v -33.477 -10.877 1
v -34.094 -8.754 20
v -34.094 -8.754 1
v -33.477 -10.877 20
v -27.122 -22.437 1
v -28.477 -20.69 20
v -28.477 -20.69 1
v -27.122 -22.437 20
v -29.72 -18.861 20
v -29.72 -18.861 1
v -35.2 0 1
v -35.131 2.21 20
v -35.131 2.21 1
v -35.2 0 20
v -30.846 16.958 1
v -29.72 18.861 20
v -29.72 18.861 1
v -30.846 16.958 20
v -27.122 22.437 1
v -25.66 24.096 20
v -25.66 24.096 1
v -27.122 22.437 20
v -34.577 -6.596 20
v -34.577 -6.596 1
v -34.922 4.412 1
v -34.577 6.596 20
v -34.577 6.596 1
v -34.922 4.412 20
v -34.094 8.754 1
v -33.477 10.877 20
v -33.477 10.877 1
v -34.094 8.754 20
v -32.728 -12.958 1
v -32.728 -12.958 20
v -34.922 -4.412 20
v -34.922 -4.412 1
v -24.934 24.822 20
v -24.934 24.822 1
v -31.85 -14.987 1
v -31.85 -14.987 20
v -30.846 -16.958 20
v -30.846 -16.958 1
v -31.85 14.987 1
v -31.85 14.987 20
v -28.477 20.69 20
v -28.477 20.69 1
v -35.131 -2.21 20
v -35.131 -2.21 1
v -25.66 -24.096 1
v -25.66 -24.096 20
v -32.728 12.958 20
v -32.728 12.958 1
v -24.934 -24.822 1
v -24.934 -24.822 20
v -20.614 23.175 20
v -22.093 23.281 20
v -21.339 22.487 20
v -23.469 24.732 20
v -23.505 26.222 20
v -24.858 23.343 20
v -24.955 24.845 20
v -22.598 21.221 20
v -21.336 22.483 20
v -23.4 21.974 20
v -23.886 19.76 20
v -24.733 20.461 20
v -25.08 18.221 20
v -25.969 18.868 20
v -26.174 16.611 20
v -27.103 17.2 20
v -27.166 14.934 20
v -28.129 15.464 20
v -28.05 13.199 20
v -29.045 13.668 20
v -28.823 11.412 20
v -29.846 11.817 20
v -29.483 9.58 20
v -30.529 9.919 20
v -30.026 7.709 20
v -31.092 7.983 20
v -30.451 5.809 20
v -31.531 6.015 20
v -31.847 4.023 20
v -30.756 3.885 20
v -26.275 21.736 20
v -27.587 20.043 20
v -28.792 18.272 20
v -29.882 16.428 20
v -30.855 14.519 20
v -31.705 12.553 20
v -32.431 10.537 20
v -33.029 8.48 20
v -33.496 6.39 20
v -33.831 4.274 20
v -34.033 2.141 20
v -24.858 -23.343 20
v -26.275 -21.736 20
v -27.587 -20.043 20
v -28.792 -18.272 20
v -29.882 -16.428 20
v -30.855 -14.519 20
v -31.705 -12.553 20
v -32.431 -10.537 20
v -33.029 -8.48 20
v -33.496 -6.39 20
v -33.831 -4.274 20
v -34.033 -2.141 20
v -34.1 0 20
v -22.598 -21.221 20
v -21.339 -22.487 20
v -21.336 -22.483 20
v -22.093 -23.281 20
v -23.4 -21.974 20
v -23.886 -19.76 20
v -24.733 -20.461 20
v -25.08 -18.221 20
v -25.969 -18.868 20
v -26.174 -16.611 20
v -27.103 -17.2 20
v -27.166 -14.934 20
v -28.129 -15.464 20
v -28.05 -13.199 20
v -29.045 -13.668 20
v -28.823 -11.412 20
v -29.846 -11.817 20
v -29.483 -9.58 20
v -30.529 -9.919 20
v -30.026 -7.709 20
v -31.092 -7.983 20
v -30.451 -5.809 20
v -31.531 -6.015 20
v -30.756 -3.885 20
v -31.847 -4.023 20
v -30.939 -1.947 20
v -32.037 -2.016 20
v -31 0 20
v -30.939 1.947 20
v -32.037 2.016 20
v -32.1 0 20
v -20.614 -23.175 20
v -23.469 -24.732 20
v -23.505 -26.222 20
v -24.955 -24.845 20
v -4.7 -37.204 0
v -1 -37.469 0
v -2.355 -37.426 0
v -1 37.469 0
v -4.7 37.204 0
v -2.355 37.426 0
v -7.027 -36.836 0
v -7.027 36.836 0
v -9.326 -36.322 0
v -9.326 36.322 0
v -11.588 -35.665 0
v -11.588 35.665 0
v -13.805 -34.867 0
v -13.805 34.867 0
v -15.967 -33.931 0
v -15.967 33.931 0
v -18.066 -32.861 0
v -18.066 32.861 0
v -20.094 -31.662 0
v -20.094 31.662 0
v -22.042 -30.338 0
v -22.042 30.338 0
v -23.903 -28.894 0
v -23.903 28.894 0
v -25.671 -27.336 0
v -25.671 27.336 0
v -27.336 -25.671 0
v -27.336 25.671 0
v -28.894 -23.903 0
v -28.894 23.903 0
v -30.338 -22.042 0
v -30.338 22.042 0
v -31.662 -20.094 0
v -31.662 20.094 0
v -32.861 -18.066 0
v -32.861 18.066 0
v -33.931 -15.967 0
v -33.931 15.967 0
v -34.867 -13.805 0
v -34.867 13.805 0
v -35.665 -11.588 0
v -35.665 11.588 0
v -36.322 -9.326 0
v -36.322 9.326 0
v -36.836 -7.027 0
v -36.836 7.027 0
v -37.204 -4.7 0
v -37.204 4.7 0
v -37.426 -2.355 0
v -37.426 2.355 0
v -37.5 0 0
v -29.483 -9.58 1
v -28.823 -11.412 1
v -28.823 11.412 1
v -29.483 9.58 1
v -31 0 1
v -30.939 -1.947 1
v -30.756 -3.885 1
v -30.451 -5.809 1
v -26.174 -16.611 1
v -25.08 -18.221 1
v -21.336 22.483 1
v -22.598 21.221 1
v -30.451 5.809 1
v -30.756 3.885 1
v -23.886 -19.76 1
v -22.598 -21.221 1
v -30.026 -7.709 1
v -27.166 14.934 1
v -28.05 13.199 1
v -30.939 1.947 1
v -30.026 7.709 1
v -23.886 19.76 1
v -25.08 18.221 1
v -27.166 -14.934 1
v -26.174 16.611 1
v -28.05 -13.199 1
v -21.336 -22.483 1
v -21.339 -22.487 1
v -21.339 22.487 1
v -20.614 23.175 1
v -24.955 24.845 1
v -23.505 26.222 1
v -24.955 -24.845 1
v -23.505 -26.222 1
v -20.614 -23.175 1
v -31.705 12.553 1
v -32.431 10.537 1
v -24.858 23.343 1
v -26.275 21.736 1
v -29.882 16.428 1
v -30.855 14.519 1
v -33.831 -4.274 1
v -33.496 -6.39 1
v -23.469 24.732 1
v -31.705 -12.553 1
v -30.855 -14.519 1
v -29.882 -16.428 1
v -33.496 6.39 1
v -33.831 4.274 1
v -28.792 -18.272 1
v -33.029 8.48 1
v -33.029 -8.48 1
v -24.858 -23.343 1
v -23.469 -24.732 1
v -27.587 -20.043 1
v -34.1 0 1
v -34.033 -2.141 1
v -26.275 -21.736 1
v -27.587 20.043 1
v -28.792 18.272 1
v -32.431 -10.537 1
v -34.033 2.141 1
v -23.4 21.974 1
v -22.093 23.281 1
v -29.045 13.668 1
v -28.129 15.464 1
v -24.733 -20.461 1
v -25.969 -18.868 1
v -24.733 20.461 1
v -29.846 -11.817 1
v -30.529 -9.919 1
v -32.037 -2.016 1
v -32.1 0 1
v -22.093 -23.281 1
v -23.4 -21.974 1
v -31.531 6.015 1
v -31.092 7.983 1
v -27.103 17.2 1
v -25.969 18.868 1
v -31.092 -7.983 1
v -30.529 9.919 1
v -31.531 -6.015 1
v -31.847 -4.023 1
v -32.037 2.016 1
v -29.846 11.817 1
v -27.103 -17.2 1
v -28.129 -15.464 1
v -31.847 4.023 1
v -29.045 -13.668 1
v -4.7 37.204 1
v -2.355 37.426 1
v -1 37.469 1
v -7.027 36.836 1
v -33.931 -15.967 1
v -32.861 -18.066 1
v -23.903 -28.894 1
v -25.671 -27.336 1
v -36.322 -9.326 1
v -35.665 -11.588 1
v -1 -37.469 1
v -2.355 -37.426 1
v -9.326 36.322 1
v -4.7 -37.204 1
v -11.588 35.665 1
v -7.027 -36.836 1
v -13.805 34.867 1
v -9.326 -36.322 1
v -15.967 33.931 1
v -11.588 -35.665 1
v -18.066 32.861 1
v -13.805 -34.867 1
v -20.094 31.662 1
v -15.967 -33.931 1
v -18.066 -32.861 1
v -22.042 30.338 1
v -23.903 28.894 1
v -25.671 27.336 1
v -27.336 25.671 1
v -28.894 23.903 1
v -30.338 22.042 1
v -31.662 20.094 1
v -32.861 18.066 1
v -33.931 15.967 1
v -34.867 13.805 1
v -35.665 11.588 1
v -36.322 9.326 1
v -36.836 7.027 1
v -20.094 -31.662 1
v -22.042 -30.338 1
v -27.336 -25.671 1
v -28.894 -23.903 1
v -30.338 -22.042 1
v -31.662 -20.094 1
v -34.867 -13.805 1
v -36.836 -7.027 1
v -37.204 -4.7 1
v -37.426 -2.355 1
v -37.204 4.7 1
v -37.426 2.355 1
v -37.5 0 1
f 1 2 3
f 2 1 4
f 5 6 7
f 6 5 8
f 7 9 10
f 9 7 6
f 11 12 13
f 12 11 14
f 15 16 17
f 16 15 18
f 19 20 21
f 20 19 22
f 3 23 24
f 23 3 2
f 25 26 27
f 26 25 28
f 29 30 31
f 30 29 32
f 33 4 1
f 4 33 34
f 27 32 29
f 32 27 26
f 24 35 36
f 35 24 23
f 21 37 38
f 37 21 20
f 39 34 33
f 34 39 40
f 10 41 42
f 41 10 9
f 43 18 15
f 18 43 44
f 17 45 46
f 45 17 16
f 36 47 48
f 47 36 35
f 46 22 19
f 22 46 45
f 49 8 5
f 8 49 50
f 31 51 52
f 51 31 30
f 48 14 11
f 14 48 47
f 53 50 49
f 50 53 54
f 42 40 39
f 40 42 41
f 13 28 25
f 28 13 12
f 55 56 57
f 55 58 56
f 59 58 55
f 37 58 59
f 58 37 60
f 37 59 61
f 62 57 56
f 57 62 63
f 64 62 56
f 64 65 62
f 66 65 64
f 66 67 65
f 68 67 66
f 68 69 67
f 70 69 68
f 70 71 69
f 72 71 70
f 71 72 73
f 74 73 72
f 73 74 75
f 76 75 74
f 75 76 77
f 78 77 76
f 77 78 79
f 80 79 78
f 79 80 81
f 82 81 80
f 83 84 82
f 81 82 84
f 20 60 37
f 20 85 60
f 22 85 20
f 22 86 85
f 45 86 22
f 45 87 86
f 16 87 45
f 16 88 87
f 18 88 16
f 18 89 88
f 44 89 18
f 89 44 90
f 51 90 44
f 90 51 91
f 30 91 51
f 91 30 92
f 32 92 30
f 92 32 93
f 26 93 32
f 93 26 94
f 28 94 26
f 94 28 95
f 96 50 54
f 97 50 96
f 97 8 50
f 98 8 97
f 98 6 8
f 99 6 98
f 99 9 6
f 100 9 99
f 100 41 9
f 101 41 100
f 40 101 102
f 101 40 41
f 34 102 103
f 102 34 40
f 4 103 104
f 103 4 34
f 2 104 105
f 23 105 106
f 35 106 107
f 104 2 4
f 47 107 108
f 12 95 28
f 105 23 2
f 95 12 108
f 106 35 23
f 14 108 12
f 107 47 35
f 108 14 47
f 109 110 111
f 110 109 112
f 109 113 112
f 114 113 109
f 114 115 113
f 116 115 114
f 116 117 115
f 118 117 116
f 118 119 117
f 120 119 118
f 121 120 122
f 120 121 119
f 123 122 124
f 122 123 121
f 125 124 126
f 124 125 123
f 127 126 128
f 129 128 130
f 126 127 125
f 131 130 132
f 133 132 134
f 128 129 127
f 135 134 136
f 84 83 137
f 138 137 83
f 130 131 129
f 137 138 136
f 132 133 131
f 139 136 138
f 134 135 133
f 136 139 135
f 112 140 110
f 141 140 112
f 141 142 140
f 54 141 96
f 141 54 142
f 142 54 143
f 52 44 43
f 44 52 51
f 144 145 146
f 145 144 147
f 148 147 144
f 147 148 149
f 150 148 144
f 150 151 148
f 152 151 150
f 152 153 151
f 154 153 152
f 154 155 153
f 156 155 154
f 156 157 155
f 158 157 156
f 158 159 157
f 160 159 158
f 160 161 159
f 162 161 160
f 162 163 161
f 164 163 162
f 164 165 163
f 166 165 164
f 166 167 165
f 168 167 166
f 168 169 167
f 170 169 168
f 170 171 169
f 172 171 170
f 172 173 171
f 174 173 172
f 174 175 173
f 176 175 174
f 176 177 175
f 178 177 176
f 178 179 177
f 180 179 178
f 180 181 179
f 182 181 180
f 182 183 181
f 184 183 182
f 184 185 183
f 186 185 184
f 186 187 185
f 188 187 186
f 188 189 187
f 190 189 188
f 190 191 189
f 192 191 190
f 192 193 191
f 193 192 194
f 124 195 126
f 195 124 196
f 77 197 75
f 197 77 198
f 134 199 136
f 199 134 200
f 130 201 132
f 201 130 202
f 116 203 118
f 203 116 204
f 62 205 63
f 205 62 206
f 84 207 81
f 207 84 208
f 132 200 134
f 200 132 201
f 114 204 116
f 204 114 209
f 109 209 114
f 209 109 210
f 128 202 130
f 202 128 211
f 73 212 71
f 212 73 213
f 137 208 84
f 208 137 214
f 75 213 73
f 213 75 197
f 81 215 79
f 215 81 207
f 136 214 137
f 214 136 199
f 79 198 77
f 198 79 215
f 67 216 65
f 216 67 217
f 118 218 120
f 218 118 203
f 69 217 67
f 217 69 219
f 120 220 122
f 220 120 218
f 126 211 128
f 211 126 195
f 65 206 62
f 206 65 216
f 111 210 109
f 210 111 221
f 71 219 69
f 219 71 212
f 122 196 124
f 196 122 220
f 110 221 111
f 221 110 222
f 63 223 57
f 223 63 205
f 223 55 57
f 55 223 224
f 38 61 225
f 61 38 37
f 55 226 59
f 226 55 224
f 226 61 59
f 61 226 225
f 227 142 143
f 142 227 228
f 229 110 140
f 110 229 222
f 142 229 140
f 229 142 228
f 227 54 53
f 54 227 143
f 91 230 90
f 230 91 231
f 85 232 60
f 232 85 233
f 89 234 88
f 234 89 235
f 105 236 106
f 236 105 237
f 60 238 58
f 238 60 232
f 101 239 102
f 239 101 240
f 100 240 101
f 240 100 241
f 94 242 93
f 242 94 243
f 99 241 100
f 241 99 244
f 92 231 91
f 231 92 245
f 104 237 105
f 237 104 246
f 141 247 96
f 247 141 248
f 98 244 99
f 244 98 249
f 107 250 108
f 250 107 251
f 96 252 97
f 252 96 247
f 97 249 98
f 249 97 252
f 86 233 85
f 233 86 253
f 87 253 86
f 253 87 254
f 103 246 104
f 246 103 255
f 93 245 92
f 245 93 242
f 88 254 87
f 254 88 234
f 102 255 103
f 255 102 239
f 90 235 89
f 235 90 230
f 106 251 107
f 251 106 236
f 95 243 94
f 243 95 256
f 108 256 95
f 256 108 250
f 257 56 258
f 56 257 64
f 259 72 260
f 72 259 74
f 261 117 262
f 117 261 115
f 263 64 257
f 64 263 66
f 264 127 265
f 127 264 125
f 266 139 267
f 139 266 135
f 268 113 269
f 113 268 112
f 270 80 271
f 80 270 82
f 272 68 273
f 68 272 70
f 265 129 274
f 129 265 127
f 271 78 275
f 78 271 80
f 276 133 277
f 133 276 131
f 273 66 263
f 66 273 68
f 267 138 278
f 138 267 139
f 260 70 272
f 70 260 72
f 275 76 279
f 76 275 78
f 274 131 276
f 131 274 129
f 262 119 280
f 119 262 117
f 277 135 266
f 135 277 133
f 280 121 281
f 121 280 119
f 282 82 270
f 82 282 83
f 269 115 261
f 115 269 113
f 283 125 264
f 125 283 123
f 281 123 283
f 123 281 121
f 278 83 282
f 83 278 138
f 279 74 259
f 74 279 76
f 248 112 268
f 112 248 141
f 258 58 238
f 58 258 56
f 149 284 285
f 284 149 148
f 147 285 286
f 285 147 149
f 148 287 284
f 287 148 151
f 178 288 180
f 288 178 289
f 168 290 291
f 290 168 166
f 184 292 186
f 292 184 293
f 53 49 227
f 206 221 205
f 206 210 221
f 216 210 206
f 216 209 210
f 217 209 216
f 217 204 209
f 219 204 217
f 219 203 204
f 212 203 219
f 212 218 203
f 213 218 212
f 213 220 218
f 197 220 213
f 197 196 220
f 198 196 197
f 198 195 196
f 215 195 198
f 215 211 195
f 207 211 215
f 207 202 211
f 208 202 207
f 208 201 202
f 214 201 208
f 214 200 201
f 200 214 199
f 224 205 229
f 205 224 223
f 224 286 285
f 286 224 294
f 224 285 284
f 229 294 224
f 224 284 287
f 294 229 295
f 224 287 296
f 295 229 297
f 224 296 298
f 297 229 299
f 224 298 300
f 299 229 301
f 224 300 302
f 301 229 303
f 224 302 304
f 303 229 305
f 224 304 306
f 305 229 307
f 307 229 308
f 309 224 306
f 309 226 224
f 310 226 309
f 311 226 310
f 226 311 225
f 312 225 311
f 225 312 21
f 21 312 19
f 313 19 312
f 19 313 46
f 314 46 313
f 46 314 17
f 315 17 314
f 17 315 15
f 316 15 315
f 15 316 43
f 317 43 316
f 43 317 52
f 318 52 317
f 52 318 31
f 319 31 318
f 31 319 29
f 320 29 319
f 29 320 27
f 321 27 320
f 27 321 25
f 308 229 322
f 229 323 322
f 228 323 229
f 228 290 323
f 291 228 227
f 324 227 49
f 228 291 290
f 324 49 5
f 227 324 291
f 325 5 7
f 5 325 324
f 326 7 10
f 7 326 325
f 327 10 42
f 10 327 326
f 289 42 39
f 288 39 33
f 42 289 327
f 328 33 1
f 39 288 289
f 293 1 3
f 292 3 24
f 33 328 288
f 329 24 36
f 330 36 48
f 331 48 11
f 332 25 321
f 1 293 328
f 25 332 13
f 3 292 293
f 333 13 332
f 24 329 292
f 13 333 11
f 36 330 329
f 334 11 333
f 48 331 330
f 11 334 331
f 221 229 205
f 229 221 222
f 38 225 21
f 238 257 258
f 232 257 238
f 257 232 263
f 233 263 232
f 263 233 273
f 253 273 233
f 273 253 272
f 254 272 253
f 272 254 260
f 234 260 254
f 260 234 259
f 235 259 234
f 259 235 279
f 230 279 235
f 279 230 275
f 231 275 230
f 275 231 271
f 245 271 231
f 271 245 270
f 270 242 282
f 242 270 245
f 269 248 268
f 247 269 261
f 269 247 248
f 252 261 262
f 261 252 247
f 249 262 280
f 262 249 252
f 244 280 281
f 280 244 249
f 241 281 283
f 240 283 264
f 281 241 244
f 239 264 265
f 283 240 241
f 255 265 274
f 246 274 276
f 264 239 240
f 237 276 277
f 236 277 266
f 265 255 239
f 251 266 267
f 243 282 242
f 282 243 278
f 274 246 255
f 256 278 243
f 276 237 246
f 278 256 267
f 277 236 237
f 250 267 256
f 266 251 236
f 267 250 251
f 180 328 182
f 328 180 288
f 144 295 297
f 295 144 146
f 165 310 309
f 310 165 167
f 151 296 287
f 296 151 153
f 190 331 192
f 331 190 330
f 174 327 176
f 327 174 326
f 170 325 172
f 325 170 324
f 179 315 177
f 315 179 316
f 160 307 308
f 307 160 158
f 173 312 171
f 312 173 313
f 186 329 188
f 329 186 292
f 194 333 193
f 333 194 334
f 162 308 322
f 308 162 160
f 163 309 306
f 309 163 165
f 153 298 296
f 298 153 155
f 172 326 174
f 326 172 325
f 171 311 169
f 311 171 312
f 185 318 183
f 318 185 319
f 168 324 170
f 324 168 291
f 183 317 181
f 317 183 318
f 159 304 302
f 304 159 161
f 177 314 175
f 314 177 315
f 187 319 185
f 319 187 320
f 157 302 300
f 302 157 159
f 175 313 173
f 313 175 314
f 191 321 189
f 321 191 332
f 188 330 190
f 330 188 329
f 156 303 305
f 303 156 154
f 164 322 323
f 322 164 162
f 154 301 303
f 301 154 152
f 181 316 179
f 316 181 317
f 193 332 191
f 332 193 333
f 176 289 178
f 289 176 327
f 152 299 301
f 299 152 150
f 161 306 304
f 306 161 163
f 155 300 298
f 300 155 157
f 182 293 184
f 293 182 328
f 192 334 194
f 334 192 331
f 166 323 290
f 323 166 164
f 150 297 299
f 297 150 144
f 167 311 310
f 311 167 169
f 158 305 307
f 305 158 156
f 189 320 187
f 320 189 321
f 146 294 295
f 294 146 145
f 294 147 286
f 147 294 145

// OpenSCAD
// Rinne mit Hohlraum und automatisch angepassten Rechtecken
// Maße in mm
// Angepasst für einen variablen Öffnungswinkel
// Korrigierte Version für höhere Öffnungswinkel

// Steuerungsparameter - mit diesen Variablen können Teile ein-/ausgeblendet werden
show_steckplatz = true;  // Auf true setzen, um den Steckplatz anzuzeigen
show_kreis = true;       // Auf true setzen, um den Kreis anzuzeigen
show_halbkreis = true;   // Auf true gesetzt, um einen Halbkreis statt eines vollen Kreises anzuzeigen
schnitt_hoehe = 0;       // Höhe des Schnitts vom Mittelpunkt aus (0 = genau Halbkreis, positiver Wert = mehr abschneiden)

// Parameter
hoehe = 20;                 
innendurchmesser = 62; 
wandstaerke_aussen = 4.2;       // Gesamtwandstärke
abstand_zwischen_schalen = 2; // Abstand zwischen den beiden Halbschalen
rechteck_dicke = 2;           // Dicke der Verschlussrechtecke
gesamtoeffnungswinkel = 93;   // Gesamtöffnungswinkel

// Berechnung abgeleiteter Werte
innenradius = innendurchmesser / 2;
aussenradius = innenradius + wandstaerke_aussen;
mittelpunkt_radius = (innenradius + aussenradius) / 2;

// Dicke der einzelnen Halbschalen berechnen
schale_dicke = (wandstaerke_aussen - abstand_zwischen_schalen) / 2;

// Berechnung der Positionen für die Rechtecke
// Position der inneren Kante des Hohlraums
hohlraum_innen_y = innenradius + schale_dicke;
// Position der äußeren Kante des Hohlraums
hohlraum_aussen_y = aussenradius - schale_dicke;

// Berechnungen für die Rinne
start_winkel = 180 - gesamtoeffnungswinkel/2;  // Startwinkel für den Schnitt
end_winkel = 180 + gesamtoeffnungswinkel/2;    // Endwinkel für den Schnitt (KORRIGIERT)

// Modul für Rinnensegment mit angepasstem Öffnungswinkel
module rinnen_segment(radius, hoehe) {
    rotate([0, 0, start_winkel]) {
        rotate_extrude(angle = gesamtoeffnungswinkel, $fn = 100)
            translate([radius, 0, 0])
                square([0.001, hoehe]); // Sehr dünne Linie zur Erzeugung des Segments
    }
}

// Modul für den Steckplatz
module steckplatz(
    hoehe = 20,
    innendurchmesser = 62,
    wandstaerke_aussen = 4,
    abstand_zwischen_schalen = 1.9,
    rechteck_dicke = 2,
    gesamtoeffnungswinkel = 90
) {
    // Berechnung abgeleiteter Werte
    innenradius = innendurchmesser / 2;
    aussenradius = innenradius + wandstaerke_aussen;
    
    // Dicke der einzelnen Halbschalen berechnen
    schale_dicke = (wandstaerke_aussen - abstand_zwischen_schalen) / 2;
    
    // Berechnungen für die Rinne
    start_winkel = 180 - gesamtoeffnungswinkel/2;  // Startwinkel für den Schnitt
    end_winkel = 180 + gesamtoeffnungswinkel/2;    // Endwinkel für den Schnitt (KORRIGIERT)
    
    // Winkel für die Rechtecke an den Enden der Rinne
    rechteck_winkel_rechts = start_winkel;     // Rechter Endpunkt der Rinne
    rechteck_winkel_links = end_winkel;        // Linker Endpunkt der Rinne (KORRIGIERT)
    
    // Gesamtes Modell
    difference() {
        union() {
            // Äußere Schale
            difference() {
                // Äußerer Zylinder
                cylinder(h = hoehe, r = aussenradius, center = false, $fn = 100);
                
                // Innerer Hohlraum
                cylinder(h = hoehe + 1, r = innenradius, center = false, $fn = 100);
                
                // Segment herausschneiden für den Öffnungswinkel
                rotate([0, 0, end_winkel])
                    rotate_extrude(angle = 360 - gesamtoeffnungswinkel, $fn = 100)
                        translate([0, 0, 0])
                            square([aussenradius + 1, hoehe + 2]);
            }
            
            // Erstes Rechteck (rechte Seite)
            rotate([0, 0, rechteck_winkel_rechts]) 
                translate([innenradius, -rechteck_dicke/2, 0])
                    cube([wandstaerke_aussen, rechteck_dicke, hoehe]);
            
            // Zweites Rechteck (linke Seite)
            rotate([0, 0, rechteck_winkel_links]) 
                translate([innenradius, -rechteck_dicke/2, 0])
                    cube([wandstaerke_aussen, rechteck_dicke, hoehe]);
        }
        
        // Hohlraum in der Mitte der Wandstärke
        difference() {
            cylinder(h = hoehe + 1, r = aussenradius - schale_dicke, center = false, $fn = 100);
            cylinder(h = hoehe + 2, r = innenradius + schale_dicke, center = false, $fn = 100);
            
            // Segment herausschneiden für den Öffnungswinkel (für den Hohlraum)
            rotate([0, 0, end_winkel])
                rotate_extrude(angle = 360 - gesamtoeffnungswinkel, $fn = 100)
                    translate([0, 0, 0])
                        square([aussenradius + 1, hoehe + 3]);
        }
    }
}

// Modul für einen Kreis mit bestimmtem Durchmesser und Stärke
module kreis(durchmesser = 75, staerke = 1, hoehe = 1, gefuellt = true) {
    if (gefuellt) {
        // Gefüllter Kreis
        cylinder(h = hoehe, d = durchmesser, center = false, $fn = 100);
    } else {
        // Ringförmiger Kreis
        difference() {
            cylinder(h = hoehe, d = durchmesser, center = false, $fn = 100);
            cylinder(h = hoehe + 1, d = durchmesser - 2 * staerke, center = false, $fn = 100);
        }
    }
}

// Modul für einen Halbkreis mit einstellbarer Schnitthöhe und Rotation um 90 Grad
module halbkreis(durchmesser = 75, staerke = 1, hoehe = 1, gefuellt = true, schnitt_position = 0) {
    rotate([0, 0, 90]) { // Um 90 Grad rotieren, damit der Einschub richtig sitzt
        difference() {
            // Basis-Kreis
            kreis(durchmesser, staerke, hoehe, gefuellt);
            
            // Schnittblock - schneidet den Kreis von unten
            // Die Schnitthöhe kann angepasst werden:
            // - schnitt_position = 0: genau in der Mitte (Halbkreis)
            // - schnitt_position > 0: mehr vom Kreis abschneiden (weniger als Halbkreis)
            // - schnitt_position < 0: weniger vom Kreis abschneiden (mehr als Halbkreis)
            
            // Größerer Schnittblock, der garantiert, dass wir nie von der anderen Seite schneiden
            translate([-durchmesser/2 - 1, -durchmesser - 1 + schnitt_position, -1])
                cube([durchmesser + 2, durchmesser + 2, hoehe + 2]);
        }
    }
}

// Beispiel für die Verwendung der Module - mit expliziter Übergabe der Parameter
if (show_steckplatz) {
    // Steckplatz mit expliziter Übergabe des gesamtoeffnungswinkel-Parameters
    steckplatz(
        hoehe = hoehe,
        innendurchmesser = innendurchmesser,
        wandstaerke_aussen = wandstaerke_aussen,
        abstand_zwischen_schalen = abstand_zwischen_schalen,
        rechteck_dicke = rechteck_dicke,
        gesamtoeffnungswinkel = gesamtoeffnungswinkel
    );
}

if (show_kreis) {
    if (show_halbkreis) {
        // Halbkreis-Parameter ebenfalls explizit übergeben
        halbkreis(
            durchmesser = 75,
            staerke = 1,
            hoehe = 1,
            gefuellt = true,
            schnitt_position = schnitt_hoehe
        );
    } else {
        // Kreis-Parameter ebenfalls explizit übergeben
        kreis(
            durchmesser = 75,
            staerke = 1,
            hoehe = 1,
            gefuellt = true
        );
    }
}
